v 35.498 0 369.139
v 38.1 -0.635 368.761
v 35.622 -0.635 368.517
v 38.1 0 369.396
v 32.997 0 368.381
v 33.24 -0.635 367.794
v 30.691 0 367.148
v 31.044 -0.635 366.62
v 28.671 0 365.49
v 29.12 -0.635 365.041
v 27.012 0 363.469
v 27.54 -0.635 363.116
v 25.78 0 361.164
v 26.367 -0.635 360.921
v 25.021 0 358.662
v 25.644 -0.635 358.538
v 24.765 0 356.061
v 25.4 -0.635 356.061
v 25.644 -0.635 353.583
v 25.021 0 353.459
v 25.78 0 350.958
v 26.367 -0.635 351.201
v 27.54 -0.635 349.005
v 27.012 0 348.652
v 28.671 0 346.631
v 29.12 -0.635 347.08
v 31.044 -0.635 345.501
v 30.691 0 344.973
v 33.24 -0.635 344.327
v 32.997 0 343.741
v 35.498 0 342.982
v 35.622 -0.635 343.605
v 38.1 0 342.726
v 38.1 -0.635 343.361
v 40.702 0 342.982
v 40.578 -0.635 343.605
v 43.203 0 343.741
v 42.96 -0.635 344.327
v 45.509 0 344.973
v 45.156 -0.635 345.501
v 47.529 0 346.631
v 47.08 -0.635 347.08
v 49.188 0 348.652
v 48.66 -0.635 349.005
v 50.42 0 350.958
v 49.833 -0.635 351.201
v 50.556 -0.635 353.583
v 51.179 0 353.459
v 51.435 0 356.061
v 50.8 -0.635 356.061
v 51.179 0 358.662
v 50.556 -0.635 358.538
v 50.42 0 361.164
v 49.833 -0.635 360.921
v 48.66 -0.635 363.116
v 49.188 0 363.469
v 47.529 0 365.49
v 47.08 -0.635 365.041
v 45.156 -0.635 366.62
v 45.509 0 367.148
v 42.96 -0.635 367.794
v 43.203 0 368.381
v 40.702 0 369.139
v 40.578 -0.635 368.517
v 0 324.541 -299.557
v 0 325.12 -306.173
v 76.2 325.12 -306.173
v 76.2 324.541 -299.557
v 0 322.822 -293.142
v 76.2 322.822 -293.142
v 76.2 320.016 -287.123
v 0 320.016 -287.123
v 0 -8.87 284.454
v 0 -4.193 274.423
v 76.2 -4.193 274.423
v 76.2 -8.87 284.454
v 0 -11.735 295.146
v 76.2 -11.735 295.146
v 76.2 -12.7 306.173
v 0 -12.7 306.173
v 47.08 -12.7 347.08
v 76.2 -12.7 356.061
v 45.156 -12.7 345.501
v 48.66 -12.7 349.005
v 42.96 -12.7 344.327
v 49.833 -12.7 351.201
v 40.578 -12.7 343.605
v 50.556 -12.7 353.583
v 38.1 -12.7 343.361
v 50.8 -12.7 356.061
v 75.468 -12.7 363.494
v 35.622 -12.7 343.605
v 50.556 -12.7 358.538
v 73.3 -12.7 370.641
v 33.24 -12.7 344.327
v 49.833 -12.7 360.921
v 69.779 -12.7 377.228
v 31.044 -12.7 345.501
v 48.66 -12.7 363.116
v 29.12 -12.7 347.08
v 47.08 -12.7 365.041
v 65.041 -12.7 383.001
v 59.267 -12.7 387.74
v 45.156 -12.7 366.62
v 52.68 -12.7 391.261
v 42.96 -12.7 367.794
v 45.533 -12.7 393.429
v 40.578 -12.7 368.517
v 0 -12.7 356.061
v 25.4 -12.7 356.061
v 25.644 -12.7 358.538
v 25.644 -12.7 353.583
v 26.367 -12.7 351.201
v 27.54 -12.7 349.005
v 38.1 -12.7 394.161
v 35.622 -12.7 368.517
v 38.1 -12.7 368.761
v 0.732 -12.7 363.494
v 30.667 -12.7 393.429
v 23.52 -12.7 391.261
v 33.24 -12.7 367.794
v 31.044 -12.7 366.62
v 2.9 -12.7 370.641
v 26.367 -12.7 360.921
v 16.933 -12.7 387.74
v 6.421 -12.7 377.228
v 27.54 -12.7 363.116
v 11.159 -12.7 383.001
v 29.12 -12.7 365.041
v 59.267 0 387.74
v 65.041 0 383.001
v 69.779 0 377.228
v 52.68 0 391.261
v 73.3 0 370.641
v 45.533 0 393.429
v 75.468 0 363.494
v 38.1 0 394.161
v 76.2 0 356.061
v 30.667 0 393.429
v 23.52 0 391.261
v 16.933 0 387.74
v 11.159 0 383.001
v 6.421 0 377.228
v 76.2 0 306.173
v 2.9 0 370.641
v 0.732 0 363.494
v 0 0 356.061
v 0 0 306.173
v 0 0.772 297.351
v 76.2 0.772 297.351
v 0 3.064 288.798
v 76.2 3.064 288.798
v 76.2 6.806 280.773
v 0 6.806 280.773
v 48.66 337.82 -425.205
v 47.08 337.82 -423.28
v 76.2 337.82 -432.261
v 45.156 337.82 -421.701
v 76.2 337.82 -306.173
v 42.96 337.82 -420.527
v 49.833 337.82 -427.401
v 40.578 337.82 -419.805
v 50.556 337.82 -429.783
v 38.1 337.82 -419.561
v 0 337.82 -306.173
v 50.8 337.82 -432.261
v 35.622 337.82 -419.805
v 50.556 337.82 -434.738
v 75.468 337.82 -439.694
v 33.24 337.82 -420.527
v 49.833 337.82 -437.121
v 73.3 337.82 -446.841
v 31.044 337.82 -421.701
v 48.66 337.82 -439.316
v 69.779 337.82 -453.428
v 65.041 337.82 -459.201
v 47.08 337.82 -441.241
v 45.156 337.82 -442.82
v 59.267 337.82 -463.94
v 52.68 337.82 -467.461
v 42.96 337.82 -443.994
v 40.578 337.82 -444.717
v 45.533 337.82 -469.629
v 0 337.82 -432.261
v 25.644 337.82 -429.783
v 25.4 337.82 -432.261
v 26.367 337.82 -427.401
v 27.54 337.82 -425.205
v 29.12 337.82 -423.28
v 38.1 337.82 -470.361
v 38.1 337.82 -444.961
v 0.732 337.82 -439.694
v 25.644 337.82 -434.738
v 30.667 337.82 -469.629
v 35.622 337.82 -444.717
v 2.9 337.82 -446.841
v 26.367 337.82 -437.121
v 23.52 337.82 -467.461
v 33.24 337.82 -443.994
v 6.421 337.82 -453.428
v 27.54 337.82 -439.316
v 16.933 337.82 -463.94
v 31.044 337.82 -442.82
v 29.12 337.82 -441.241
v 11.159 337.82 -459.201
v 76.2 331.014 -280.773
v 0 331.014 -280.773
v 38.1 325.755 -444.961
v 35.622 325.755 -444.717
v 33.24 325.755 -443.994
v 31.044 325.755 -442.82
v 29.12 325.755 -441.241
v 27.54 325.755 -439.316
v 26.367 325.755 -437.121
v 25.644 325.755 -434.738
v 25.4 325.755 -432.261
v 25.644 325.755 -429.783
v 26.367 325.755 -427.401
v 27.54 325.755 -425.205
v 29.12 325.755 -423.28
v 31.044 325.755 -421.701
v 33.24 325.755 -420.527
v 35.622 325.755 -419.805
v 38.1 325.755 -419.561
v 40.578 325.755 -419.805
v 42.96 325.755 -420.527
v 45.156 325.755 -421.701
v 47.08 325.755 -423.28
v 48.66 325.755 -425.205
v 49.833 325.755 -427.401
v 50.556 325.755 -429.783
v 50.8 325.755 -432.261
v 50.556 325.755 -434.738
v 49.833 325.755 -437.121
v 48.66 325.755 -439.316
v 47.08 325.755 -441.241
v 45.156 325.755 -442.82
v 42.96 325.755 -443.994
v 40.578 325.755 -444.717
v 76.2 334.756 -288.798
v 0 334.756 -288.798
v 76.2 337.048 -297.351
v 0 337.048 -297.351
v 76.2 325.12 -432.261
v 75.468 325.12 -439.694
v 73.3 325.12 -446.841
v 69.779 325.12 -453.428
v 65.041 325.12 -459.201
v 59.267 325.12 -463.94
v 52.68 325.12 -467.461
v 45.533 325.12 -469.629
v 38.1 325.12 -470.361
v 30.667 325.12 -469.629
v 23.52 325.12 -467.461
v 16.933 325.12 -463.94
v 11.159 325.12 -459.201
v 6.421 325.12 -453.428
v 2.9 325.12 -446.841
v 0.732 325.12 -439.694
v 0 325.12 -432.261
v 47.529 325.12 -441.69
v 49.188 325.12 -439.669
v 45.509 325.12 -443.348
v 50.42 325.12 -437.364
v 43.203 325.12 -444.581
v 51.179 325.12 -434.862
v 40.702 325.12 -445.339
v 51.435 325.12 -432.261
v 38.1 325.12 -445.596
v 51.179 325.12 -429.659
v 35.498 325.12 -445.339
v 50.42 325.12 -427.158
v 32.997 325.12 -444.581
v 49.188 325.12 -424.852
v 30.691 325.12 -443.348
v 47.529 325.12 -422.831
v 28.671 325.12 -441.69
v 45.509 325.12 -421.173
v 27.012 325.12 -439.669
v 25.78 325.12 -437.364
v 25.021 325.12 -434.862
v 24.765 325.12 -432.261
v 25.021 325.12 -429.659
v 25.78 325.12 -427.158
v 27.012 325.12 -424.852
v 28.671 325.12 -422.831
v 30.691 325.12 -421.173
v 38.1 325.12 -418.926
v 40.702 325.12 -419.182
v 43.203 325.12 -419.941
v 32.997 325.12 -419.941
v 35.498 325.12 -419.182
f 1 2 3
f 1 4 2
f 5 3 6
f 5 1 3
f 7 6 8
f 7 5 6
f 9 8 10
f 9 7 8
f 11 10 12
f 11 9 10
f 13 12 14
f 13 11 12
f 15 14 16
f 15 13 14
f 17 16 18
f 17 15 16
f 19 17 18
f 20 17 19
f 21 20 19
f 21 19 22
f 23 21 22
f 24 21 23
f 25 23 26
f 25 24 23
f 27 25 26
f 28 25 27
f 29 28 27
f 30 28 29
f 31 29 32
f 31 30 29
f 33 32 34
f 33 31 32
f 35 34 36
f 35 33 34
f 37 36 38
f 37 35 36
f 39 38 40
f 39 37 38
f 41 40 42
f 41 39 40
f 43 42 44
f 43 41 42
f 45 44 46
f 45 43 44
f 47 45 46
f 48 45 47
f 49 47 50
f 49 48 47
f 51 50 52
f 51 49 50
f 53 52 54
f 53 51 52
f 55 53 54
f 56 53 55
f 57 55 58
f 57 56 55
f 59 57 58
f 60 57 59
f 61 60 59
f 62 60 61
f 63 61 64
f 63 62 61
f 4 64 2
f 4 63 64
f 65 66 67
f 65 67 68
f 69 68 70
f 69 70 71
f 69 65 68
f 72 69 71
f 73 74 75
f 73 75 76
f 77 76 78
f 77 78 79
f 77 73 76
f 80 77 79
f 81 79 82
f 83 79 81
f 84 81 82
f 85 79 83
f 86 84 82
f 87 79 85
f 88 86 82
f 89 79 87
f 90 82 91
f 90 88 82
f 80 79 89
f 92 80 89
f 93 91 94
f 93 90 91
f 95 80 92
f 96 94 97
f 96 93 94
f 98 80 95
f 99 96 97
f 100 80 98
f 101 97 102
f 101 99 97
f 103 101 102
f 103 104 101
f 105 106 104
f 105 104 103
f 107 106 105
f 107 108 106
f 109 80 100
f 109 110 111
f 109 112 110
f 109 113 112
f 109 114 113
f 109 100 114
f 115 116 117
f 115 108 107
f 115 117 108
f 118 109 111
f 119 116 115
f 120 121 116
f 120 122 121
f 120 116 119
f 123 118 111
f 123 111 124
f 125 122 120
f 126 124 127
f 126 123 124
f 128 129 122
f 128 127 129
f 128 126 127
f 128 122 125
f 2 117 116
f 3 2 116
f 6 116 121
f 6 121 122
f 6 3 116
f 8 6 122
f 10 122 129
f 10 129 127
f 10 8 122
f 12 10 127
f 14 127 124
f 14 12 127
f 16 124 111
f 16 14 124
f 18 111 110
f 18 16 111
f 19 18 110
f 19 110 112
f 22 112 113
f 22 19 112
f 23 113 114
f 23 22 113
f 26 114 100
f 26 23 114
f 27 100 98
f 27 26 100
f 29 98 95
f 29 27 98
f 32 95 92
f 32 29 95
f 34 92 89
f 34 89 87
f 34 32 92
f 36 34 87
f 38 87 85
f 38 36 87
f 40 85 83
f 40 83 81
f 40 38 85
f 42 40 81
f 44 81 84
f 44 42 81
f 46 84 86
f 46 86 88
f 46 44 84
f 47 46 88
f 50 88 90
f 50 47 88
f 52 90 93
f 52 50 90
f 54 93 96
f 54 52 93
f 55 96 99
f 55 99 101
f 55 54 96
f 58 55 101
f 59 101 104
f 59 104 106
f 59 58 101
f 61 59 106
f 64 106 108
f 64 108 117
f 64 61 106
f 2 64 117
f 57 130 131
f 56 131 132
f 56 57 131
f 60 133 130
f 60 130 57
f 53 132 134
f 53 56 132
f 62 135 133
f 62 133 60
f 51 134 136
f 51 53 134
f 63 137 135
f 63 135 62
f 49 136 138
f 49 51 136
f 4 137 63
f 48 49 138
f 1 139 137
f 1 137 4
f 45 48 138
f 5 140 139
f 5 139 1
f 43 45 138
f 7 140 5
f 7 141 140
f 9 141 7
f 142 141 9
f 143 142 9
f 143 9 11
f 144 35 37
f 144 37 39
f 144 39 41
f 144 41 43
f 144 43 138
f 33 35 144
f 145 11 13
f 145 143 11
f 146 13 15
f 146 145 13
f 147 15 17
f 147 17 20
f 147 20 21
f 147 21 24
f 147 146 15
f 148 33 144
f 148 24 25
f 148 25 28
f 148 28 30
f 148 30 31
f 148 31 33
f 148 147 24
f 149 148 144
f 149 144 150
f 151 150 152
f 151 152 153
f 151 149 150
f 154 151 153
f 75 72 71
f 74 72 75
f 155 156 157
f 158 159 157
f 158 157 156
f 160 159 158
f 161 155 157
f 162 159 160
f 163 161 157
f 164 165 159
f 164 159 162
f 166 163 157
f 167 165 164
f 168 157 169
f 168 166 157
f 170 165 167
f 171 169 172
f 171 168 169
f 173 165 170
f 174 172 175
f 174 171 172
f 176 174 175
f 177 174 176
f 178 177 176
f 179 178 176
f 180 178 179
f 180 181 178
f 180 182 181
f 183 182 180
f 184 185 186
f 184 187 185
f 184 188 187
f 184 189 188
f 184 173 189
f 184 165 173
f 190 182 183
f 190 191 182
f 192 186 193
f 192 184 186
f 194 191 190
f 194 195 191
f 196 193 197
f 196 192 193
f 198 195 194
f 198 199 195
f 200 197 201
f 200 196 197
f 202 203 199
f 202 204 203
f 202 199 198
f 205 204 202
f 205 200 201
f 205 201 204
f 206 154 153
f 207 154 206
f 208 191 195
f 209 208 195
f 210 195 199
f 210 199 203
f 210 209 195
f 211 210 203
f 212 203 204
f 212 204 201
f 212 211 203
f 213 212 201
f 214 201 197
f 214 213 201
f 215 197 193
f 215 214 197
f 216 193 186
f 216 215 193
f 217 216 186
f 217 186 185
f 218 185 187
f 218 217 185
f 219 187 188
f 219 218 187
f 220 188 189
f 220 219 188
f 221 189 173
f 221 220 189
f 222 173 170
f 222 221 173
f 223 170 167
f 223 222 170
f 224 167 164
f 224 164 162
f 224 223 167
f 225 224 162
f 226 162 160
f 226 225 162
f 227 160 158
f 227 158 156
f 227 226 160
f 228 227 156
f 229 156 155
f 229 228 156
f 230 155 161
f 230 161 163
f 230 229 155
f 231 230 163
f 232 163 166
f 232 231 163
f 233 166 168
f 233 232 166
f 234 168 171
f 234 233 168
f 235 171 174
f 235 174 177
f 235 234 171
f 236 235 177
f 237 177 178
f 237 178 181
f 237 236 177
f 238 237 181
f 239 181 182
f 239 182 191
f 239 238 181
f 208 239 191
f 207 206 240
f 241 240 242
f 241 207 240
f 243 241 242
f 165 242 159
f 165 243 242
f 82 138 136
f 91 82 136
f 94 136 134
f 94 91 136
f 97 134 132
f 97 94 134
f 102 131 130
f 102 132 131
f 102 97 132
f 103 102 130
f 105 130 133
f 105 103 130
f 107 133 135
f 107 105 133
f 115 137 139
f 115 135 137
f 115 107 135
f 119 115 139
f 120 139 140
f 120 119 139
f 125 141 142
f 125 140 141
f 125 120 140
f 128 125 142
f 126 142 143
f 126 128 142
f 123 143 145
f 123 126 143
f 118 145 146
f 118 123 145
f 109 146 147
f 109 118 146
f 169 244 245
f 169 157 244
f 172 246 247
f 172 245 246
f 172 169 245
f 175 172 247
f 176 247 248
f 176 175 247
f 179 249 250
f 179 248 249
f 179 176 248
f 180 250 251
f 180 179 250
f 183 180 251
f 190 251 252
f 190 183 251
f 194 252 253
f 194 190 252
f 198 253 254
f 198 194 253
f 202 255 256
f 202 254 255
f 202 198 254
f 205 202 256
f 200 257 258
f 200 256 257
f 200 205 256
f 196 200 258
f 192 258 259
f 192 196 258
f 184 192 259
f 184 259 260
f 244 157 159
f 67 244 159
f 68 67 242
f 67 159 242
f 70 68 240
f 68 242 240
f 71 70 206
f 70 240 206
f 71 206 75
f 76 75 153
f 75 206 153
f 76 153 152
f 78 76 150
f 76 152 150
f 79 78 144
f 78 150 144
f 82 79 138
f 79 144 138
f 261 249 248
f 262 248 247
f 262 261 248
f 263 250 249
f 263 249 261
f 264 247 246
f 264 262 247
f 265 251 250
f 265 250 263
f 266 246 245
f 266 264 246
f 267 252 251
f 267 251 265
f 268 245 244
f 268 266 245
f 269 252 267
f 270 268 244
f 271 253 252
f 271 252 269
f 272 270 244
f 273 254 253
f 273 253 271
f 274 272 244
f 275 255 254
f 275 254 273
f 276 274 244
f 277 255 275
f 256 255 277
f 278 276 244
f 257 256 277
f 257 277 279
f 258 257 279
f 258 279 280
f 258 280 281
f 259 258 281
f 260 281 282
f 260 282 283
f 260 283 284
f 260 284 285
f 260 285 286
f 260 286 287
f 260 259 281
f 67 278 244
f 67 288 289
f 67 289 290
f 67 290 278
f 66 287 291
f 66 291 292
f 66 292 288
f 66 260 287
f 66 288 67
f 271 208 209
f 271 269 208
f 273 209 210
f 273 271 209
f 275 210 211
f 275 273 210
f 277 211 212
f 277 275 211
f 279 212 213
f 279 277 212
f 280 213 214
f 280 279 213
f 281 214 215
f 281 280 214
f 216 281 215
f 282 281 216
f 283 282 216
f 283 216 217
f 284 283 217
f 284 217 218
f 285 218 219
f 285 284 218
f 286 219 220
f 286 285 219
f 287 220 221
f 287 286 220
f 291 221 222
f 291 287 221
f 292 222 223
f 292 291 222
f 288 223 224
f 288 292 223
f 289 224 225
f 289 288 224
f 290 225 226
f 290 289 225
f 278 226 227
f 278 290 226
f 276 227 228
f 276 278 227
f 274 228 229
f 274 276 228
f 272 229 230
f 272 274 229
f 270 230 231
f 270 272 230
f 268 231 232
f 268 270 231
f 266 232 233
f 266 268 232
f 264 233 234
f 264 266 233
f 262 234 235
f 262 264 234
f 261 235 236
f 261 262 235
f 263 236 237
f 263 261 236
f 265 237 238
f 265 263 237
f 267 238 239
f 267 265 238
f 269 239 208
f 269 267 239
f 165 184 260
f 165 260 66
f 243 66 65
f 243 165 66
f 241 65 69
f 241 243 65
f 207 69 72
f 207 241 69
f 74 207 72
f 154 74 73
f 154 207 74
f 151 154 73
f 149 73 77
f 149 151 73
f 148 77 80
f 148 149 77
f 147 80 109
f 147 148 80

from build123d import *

# Parameters (mm, degrees)
BOSS_EXTRUDE1_DEPTH = 76.2
FILLET1_RADIUS      = 38.1
FILLET1_LENGTH      = 12.7
FILLET2_RADIUS      = 38.1
FILLET2_LENGTH      = 12.7


with BuildPart() as part:
    # Sketch2 → Boss-Extrude1 (new body)
    with BuildSketch(Plane(origin=(0, 0, 0), x_dir=(0, 0, -1), z_dir=(1, 0, 0))):
        with BuildLine():
            Line((-394.160701906, 0), (-306.172520882, 0))
            ThreePointArc((-306.172520882, 0), (-293.024513391, 1.730968025), (-280.772520882, 6.805909488))
            Line((-280.772520882, 6.805909488), (280.772520882, 331.014090512))
            ThreePointArc((280.772520882, 331.014090512), (293.024513391, 336.089031975), (306.172520882, 337.82))
            Line((306.172520882, 337.82), (470.360701906, 337.82))
            Line((470.360701906, 337.82), (470.360701906, 325.12))
            Line((470.360701906, 325.12), (306.172520882, 325.12))
            ThreePointArc((306.172520882, 325.12), (296.311515264, 323.821773982), (287.122520882, 320.015567884))
            Line((287.122520882, 320.015567884), (-274.422520882, -4.19261314))
            ThreePointArc((-274.422520882, -4.19261314), (-289.737511518, -10.536289969), (-306.172520882, -12.7))
            Line((-306.172520882, -12.7), (-394.160701906, -12.7))
            Line((-394.160701906, -12.7), (-394.160701906, 0))
        make_face()
    extrude(amount=BOSS_EXTRUDE1_DEPTH)

    # Fillet1: full round fillet: the end face becomes a half cylinder, R = half its width
    fillet1_face = Plane((38.1, -6.35, 394.160701906), x_dir=(0, -1, 0), z_dir=(0, 0, 1))  # on the end face: x along it, z out of the body
    fillet1_slab = fillet1_face.offset(-FILLET1_RADIUS / 2) * Box(FILLET1_LENGTH, 2 * FILLET1_RADIUS, FILLET1_RADIUS, mode=Mode.PRIVATE)  # the body's end, R deep
    fillet1_round = Plane((38.1, -6.35, 356.060701906), x_dir=(0, 0, 1), z_dir=(0, -1, 0)) * Cylinder(FILLET1_RADIUS, FILLET1_LENGTH, mode=Mode.PRIVATE)  # its axis R under the face
    add(fillet1_slab - fillet1_round, mode=Mode.SUBTRACT)

    # Fillet2: full round fillet: the end face becomes a half cylinder, R = half its width
    fillet2_face = Plane((38.1, 331.47, -470.360701906), x_dir=(0, 1, 0), z_dir=(0, 0, -1))  # on the end face: x along it, z out of the body
    fillet2_slab = fillet2_face.offset(-FILLET2_RADIUS / 2) * Box(FILLET2_LENGTH, 2 * FILLET2_RADIUS, FILLET2_RADIUS, mode=Mode.PRIVATE)  # the body's end, R deep
    fillet2_round = Plane((38.1, 331.47, -432.260701906), x_dir=(0, 0, -1), z_dir=(0, 1, 0)) * Cylinder(FILLET2_RADIUS, FILLET2_LENGTH, mode=Mode.PRIVATE)  # its axis R under the face
    add(fillet2_slab - fillet2_round, mode=Mode.SUBTRACT)

    # Sketch4 → 1 (1) Diameter Hole1 (revolve, cut)
    with BuildSketch(Plane(origin=(38.1, 0, 356.060701906), x_dir=(0, 0, 1), z_dir=(1, 0, 0))):
        Polygon((0, 0), (0, 12.7), (12.7, 12.7), (12.7, 0.635), (13.335, 0), align=None)
    revolve(axis=Axis((38.1, 6.35, 356.060701906), (0, -1, 0)), mode=Mode.SUBTRACT)

    # Sketch7 → 1 (1) Diameter Hole2 (revolve, cut)
    with BuildSketch(Plane(origin=(38.1, 325.12, -432.260701906), x_dir=(0, 0, -1), z_dir=(1, 0, 0))):
        Polygon((0, 0), (0, 12.7), (12.7, 12.7), (12.7, 0.635), (13.335, 0), align=None)
    revolve(axis=Axis((38.1, 318.77, -432.260701906), (0, 1, 0)), mode=Mode.SUBTRACT)


solid = part.part
